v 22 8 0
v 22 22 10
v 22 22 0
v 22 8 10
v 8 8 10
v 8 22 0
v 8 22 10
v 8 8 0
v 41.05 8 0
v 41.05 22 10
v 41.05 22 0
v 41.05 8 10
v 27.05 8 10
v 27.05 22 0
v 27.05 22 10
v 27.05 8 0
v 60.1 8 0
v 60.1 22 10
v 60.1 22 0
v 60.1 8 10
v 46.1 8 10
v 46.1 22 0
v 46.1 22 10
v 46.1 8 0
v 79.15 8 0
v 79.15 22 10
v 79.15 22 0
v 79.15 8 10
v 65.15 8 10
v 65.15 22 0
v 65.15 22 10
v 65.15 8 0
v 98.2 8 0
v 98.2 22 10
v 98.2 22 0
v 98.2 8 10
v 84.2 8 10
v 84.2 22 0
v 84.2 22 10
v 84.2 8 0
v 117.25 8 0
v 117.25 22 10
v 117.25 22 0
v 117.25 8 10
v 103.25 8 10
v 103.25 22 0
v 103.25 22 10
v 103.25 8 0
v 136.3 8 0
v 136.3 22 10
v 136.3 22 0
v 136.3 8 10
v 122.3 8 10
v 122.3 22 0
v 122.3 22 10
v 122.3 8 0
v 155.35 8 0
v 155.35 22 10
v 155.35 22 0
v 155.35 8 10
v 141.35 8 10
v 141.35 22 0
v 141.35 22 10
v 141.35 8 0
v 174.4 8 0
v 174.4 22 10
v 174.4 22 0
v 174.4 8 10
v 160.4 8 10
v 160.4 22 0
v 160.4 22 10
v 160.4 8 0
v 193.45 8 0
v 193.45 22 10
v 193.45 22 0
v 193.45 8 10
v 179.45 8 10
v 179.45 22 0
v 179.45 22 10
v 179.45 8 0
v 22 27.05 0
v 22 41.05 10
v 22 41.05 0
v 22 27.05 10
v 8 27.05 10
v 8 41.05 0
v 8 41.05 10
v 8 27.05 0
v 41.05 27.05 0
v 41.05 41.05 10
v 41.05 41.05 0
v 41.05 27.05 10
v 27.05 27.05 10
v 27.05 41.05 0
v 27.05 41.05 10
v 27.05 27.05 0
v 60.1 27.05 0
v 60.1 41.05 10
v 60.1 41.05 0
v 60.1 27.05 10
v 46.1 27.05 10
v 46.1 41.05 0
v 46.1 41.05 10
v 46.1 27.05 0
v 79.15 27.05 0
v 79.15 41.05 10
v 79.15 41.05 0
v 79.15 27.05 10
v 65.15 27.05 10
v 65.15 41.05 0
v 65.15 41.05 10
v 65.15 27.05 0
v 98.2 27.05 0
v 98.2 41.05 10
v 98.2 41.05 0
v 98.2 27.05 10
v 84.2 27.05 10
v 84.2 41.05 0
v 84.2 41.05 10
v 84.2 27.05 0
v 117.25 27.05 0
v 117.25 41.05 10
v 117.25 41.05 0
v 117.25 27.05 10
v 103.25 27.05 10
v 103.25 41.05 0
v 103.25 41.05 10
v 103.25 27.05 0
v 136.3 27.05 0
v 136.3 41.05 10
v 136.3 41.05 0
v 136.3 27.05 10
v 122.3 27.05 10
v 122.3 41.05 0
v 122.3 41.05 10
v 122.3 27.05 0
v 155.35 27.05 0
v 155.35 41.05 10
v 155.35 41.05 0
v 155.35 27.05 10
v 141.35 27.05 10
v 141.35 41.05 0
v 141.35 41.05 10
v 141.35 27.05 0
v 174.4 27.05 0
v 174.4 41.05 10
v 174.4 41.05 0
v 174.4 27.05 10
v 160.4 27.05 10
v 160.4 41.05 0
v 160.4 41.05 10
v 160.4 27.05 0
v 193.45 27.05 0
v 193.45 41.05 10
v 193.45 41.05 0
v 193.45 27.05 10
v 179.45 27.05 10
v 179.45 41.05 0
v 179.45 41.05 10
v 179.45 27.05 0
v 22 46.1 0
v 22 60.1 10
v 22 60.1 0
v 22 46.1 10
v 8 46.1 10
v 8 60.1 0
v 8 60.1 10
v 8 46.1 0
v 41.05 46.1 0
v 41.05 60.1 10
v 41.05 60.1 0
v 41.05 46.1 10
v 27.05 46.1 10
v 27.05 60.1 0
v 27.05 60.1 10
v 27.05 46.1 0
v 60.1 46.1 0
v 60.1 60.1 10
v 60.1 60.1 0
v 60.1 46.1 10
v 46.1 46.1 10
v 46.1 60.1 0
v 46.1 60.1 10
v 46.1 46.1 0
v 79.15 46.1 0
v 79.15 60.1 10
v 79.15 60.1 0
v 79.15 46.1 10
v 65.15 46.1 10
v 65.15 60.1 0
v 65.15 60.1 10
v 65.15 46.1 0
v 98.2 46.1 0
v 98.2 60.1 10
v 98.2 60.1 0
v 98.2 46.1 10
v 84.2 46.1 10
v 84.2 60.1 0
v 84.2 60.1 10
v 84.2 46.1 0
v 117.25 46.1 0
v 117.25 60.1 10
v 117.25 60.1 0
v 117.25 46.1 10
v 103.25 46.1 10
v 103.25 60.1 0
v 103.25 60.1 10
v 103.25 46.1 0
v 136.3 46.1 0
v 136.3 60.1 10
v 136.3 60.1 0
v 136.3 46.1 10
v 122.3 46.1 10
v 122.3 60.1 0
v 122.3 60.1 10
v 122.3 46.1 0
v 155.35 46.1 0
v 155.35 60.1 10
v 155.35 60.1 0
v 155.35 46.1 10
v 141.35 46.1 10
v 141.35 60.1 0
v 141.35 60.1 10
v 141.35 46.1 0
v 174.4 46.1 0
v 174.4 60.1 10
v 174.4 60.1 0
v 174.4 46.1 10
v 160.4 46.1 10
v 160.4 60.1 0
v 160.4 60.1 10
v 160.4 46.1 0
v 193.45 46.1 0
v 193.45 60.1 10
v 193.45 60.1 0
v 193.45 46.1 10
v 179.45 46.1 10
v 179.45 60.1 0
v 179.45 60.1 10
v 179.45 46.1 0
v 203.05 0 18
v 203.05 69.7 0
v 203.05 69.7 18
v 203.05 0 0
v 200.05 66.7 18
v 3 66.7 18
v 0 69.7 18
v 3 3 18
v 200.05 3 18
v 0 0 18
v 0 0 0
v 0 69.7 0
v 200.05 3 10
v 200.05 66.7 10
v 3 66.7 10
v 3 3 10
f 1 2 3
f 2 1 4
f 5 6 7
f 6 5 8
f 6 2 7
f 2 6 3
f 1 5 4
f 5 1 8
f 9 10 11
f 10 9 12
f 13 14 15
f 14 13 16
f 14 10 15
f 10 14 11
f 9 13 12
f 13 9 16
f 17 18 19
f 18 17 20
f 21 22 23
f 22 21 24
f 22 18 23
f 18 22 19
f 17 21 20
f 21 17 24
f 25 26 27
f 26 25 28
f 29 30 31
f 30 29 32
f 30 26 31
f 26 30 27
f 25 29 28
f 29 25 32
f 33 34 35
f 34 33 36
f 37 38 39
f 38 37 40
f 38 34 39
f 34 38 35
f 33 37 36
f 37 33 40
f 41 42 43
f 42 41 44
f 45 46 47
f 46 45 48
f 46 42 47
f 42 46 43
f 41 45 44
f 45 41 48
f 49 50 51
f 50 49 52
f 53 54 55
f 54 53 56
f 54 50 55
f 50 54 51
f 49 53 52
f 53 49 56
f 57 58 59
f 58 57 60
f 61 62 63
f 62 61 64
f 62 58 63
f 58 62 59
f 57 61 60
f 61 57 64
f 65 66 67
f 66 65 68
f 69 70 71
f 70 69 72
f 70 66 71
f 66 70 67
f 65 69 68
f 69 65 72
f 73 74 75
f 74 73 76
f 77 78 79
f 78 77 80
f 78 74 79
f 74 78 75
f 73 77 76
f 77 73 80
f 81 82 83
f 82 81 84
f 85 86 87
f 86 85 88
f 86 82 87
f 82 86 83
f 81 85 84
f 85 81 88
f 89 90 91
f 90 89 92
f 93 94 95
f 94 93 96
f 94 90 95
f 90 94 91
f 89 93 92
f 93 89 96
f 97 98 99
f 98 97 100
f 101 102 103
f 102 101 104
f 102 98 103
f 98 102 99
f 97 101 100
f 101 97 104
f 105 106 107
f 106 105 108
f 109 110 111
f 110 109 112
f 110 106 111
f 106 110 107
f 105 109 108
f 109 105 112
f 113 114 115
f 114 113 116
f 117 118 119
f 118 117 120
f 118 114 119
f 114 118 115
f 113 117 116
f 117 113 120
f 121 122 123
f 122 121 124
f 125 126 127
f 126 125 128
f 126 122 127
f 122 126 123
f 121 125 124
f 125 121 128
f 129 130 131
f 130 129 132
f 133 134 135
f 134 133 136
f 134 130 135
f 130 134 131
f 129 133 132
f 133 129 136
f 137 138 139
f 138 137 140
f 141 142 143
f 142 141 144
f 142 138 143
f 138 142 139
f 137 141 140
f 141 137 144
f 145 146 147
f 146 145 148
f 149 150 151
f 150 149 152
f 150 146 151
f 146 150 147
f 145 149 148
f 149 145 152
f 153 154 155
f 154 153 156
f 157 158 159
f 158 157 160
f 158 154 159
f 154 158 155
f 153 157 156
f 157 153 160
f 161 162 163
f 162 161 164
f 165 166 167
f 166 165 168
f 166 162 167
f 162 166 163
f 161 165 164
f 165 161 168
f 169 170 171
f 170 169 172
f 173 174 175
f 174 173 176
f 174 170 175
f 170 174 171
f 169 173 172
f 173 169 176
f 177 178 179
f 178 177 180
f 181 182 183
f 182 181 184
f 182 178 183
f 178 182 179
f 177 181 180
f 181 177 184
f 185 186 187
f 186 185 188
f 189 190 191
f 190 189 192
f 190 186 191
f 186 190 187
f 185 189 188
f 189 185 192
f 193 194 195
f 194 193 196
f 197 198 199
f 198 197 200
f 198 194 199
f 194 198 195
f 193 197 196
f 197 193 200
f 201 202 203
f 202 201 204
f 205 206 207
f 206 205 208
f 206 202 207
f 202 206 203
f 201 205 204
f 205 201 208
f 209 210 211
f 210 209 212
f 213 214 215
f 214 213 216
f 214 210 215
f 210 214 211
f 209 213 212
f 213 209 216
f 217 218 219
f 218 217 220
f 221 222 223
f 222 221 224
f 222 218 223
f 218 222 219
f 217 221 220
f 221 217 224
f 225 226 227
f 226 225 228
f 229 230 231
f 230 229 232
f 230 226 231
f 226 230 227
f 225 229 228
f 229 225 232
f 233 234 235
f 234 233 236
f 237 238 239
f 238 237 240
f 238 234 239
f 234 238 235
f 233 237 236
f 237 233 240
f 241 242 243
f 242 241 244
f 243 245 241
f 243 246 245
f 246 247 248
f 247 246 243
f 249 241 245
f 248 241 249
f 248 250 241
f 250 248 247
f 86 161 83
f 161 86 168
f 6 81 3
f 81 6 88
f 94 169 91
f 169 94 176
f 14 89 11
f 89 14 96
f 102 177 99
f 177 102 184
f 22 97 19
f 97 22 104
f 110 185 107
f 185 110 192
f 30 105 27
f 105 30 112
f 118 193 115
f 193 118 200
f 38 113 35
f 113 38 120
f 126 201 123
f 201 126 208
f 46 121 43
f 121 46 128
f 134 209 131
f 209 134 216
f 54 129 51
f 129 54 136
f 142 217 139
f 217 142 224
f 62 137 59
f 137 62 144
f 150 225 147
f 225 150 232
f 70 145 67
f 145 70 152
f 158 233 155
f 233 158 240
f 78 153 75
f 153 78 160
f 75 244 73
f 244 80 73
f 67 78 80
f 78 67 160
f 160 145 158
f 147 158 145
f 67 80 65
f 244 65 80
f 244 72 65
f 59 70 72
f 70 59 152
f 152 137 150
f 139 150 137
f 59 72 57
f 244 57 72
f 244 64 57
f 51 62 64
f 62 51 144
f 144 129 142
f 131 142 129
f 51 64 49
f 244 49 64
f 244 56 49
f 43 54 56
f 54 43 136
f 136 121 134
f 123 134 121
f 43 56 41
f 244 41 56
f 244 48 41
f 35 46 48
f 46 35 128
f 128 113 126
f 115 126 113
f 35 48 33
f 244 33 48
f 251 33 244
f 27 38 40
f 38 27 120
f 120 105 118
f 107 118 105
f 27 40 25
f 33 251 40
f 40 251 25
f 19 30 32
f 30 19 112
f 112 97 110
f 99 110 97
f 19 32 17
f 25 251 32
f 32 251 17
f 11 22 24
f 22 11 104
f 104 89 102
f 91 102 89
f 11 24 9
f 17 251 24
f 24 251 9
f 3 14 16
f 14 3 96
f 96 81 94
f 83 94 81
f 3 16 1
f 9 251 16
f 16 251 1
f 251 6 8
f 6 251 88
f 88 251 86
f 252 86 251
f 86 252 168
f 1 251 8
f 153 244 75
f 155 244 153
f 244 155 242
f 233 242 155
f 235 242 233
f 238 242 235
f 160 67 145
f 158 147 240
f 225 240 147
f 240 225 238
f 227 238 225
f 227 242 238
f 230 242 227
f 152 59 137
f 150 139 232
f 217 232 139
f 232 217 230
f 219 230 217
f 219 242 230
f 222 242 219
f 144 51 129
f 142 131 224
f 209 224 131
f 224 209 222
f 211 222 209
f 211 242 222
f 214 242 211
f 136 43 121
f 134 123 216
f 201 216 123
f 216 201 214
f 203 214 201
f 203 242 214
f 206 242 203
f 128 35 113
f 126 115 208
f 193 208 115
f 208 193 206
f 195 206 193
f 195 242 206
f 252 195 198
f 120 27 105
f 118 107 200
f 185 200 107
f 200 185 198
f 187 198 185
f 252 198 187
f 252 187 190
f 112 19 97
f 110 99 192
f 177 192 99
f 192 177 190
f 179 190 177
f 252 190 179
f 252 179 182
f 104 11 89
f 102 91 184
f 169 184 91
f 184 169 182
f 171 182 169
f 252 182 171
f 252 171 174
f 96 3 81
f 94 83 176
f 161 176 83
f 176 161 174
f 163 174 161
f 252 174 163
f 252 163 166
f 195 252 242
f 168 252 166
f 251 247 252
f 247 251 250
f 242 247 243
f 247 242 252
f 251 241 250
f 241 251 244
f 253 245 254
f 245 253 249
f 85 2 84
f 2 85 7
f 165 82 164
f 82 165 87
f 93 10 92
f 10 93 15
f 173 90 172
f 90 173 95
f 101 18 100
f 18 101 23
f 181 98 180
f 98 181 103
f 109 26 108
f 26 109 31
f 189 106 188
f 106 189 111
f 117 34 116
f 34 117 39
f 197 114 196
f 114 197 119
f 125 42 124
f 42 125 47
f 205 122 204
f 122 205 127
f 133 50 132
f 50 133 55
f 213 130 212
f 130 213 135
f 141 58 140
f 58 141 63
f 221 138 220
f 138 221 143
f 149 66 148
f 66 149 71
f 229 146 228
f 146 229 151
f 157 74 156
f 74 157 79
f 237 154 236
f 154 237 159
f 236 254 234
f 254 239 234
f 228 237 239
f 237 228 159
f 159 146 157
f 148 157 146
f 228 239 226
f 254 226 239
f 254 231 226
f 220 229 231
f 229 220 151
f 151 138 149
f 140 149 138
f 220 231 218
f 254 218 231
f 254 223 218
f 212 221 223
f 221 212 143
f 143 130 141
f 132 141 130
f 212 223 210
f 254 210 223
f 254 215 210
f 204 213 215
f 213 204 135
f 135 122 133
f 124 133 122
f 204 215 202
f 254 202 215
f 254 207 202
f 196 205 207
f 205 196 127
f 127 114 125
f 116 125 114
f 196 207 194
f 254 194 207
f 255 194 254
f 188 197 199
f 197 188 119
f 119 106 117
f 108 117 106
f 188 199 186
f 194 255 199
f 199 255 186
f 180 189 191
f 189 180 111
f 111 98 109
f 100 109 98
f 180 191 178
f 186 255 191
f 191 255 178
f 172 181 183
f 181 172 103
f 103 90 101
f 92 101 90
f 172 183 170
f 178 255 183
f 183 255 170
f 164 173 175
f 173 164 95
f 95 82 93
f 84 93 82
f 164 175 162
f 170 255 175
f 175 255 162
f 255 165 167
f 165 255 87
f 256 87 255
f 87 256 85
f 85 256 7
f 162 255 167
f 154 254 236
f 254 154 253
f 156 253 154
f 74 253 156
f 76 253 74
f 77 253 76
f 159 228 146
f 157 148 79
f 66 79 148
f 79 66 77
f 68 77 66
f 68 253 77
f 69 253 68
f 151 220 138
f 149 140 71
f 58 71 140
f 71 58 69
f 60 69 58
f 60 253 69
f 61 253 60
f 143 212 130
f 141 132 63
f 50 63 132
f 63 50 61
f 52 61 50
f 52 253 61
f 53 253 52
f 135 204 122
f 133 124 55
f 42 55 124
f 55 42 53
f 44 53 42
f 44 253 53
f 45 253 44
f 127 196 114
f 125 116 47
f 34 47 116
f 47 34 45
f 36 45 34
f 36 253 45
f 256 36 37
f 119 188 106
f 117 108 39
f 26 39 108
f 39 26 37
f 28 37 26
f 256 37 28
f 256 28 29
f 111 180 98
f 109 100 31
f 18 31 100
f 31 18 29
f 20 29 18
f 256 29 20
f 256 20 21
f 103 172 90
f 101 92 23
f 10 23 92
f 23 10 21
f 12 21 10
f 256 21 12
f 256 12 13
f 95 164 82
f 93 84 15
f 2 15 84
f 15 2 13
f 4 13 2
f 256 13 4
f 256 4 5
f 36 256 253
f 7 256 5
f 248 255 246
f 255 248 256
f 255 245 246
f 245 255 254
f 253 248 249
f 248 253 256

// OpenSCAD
// Generated keyboard case
// Layout: 3x10
// Switch type: Cherry MX

// Parameters
case_width = 203.05;
case_height = 69.70;
case_depth = 18.00;
wall_thickness = 3.00;
base_height = 10.00;
switch_cutout_size = 14.00;
key_spacing = 19.05;

module keyboard_case() {
    difference() {
        // Outer shell
        translate([0, 0, 0])
            cube([case_width, case_height, case_depth]);

        // Inner cavity
        translate([wall_thickness, wall_thickness, base_height])
            cube([case_width - 2*wall_thickness, 
                  case_height - 2*wall_thickness, 
                  case_depth - base_height + 1]);

        // Switch cutouts
        translate([wall_thickness + 5 - 0.00, wall_thickness + 5 - 0.00, -1])
            switch_plate();
    }
}

module switch_plate() {
    translate([0.00, 0.00, 0])
        cube([switch_cutout_size, switch_cutout_size, base_height + 2]);
    translate([19.05, 0.00, 0])
        cube([switch_cutout_size, switch_cutout_size, base_height + 2]);
    translate([38.10, 0.00, 0])
        cube([switch_cutout_size, switch_cutout_size, base_height + 2]);
    translate([57.15, 0.00, 0])
        cube([switch_cutout_size, switch_cutout_size, base_height + 2]);
    translate([76.20, 0.00, 0])
        cube([switch_cutout_size, switch_cutout_size, base_height + 2]);
    translate([95.25, 0.00, 0])
        cube([switch_cutout_size, switch_cutout_size, base_height + 2]);
    translate([114.30, 0.00, 0])
        cube([switch_cutout_size, switch_cutout_size, base_height + 2]);
    translate([133.35, 0.00, 0])
        cube([switch_cutout_size, switch_cutout_size, base_height + 2]);
    translate([152.40, 0.00, 0])
        cube([switch_cutout_size, switch_cutout_size, base_height + 2]);
    translate([171.45, 0.00, 0])
        cube([switch_cutout_size, switch_cutout_size, base_height + 2]);
    translate([0.00, 19.05, 0])
        cube([switch_cutout_size, switch_cutout_size, base_height + 2]);
    translate([19.05, 19.05, 0])
        cube([switch_cutout_size, switch_cutout_size, base_height + 2]);
    translate([38.10, 19.05, 0])
        cube([switch_cutout_size, switch_cutout_size, base_height + 2]);
    translate([57.15, 19.05, 0])
        cube([switch_cutout_size, switch_cutout_size, base_height + 2]);
    translate([76.20, 19.05, 0])
        cube([switch_cutout_size, switch_cutout_size, base_height + 2]);
    translate([95.25, 19.05, 0])
        cube([switch_cutout_size, switch_cutout_size, base_height + 2]);
    translate([114.30, 19.05, 0])
        cube([switch_cutout_size, switch_cutout_size, base_height + 2]);
    translate([133.35, 19.05, 0])
        cube([switch_cutout_size, switch_cutout_size, base_height + 2]);
    translate([152.40, 19.05, 0])
        cube([switch_cutout_size, switch_cutout_size, base_height + 2]);
    translate([171.45, 19.05, 0])
        cube([switch_cutout_size, switch_cutout_size, base_height + 2]);
    translate([0.00, 38.10, 0])
        cube([switch_cutout_size, switch_cutout_size, base_height + 2]);
    translate([19.05, 38.10, 0])
        cube([switch_cutout_size, switch_cutout_size, base_height + 2]);
    translate([38.10, 38.10, 0])
        cube([switch_cutout_size, switch_cutout_size, base_height + 2]);
    translate([57.15, 38.10, 0])
        cube([switch_cutout_size, switch_cutout_size, base_height + 2]);
    translate([76.20, 38.10, 0])
        cube([switch_cutout_size, switch_cutout_size, base_height + 2]);
    translate([95.25, 38.10, 0])
        cube([switch_cutout_size, switch_cutout_size, base_height + 2]);
    translate([114.30, 38.10, 0])
        cube([switch_cutout_size, switch_cutout_size, base_height + 2]);
    translate([133.35, 38.10, 0])
        cube([switch_cutout_size, switch_cutout_size, base_height + 2]);
    translate([152.40, 38.10, 0])
        cube([switch_cutout_size, switch_cutout_size, base_height + 2]);
    translate([171.45, 38.10, 0])
        cube([switch_cutout_size, switch_cutout_size, base_height + 2]);
}

// Generate the case
keyboard_case();
